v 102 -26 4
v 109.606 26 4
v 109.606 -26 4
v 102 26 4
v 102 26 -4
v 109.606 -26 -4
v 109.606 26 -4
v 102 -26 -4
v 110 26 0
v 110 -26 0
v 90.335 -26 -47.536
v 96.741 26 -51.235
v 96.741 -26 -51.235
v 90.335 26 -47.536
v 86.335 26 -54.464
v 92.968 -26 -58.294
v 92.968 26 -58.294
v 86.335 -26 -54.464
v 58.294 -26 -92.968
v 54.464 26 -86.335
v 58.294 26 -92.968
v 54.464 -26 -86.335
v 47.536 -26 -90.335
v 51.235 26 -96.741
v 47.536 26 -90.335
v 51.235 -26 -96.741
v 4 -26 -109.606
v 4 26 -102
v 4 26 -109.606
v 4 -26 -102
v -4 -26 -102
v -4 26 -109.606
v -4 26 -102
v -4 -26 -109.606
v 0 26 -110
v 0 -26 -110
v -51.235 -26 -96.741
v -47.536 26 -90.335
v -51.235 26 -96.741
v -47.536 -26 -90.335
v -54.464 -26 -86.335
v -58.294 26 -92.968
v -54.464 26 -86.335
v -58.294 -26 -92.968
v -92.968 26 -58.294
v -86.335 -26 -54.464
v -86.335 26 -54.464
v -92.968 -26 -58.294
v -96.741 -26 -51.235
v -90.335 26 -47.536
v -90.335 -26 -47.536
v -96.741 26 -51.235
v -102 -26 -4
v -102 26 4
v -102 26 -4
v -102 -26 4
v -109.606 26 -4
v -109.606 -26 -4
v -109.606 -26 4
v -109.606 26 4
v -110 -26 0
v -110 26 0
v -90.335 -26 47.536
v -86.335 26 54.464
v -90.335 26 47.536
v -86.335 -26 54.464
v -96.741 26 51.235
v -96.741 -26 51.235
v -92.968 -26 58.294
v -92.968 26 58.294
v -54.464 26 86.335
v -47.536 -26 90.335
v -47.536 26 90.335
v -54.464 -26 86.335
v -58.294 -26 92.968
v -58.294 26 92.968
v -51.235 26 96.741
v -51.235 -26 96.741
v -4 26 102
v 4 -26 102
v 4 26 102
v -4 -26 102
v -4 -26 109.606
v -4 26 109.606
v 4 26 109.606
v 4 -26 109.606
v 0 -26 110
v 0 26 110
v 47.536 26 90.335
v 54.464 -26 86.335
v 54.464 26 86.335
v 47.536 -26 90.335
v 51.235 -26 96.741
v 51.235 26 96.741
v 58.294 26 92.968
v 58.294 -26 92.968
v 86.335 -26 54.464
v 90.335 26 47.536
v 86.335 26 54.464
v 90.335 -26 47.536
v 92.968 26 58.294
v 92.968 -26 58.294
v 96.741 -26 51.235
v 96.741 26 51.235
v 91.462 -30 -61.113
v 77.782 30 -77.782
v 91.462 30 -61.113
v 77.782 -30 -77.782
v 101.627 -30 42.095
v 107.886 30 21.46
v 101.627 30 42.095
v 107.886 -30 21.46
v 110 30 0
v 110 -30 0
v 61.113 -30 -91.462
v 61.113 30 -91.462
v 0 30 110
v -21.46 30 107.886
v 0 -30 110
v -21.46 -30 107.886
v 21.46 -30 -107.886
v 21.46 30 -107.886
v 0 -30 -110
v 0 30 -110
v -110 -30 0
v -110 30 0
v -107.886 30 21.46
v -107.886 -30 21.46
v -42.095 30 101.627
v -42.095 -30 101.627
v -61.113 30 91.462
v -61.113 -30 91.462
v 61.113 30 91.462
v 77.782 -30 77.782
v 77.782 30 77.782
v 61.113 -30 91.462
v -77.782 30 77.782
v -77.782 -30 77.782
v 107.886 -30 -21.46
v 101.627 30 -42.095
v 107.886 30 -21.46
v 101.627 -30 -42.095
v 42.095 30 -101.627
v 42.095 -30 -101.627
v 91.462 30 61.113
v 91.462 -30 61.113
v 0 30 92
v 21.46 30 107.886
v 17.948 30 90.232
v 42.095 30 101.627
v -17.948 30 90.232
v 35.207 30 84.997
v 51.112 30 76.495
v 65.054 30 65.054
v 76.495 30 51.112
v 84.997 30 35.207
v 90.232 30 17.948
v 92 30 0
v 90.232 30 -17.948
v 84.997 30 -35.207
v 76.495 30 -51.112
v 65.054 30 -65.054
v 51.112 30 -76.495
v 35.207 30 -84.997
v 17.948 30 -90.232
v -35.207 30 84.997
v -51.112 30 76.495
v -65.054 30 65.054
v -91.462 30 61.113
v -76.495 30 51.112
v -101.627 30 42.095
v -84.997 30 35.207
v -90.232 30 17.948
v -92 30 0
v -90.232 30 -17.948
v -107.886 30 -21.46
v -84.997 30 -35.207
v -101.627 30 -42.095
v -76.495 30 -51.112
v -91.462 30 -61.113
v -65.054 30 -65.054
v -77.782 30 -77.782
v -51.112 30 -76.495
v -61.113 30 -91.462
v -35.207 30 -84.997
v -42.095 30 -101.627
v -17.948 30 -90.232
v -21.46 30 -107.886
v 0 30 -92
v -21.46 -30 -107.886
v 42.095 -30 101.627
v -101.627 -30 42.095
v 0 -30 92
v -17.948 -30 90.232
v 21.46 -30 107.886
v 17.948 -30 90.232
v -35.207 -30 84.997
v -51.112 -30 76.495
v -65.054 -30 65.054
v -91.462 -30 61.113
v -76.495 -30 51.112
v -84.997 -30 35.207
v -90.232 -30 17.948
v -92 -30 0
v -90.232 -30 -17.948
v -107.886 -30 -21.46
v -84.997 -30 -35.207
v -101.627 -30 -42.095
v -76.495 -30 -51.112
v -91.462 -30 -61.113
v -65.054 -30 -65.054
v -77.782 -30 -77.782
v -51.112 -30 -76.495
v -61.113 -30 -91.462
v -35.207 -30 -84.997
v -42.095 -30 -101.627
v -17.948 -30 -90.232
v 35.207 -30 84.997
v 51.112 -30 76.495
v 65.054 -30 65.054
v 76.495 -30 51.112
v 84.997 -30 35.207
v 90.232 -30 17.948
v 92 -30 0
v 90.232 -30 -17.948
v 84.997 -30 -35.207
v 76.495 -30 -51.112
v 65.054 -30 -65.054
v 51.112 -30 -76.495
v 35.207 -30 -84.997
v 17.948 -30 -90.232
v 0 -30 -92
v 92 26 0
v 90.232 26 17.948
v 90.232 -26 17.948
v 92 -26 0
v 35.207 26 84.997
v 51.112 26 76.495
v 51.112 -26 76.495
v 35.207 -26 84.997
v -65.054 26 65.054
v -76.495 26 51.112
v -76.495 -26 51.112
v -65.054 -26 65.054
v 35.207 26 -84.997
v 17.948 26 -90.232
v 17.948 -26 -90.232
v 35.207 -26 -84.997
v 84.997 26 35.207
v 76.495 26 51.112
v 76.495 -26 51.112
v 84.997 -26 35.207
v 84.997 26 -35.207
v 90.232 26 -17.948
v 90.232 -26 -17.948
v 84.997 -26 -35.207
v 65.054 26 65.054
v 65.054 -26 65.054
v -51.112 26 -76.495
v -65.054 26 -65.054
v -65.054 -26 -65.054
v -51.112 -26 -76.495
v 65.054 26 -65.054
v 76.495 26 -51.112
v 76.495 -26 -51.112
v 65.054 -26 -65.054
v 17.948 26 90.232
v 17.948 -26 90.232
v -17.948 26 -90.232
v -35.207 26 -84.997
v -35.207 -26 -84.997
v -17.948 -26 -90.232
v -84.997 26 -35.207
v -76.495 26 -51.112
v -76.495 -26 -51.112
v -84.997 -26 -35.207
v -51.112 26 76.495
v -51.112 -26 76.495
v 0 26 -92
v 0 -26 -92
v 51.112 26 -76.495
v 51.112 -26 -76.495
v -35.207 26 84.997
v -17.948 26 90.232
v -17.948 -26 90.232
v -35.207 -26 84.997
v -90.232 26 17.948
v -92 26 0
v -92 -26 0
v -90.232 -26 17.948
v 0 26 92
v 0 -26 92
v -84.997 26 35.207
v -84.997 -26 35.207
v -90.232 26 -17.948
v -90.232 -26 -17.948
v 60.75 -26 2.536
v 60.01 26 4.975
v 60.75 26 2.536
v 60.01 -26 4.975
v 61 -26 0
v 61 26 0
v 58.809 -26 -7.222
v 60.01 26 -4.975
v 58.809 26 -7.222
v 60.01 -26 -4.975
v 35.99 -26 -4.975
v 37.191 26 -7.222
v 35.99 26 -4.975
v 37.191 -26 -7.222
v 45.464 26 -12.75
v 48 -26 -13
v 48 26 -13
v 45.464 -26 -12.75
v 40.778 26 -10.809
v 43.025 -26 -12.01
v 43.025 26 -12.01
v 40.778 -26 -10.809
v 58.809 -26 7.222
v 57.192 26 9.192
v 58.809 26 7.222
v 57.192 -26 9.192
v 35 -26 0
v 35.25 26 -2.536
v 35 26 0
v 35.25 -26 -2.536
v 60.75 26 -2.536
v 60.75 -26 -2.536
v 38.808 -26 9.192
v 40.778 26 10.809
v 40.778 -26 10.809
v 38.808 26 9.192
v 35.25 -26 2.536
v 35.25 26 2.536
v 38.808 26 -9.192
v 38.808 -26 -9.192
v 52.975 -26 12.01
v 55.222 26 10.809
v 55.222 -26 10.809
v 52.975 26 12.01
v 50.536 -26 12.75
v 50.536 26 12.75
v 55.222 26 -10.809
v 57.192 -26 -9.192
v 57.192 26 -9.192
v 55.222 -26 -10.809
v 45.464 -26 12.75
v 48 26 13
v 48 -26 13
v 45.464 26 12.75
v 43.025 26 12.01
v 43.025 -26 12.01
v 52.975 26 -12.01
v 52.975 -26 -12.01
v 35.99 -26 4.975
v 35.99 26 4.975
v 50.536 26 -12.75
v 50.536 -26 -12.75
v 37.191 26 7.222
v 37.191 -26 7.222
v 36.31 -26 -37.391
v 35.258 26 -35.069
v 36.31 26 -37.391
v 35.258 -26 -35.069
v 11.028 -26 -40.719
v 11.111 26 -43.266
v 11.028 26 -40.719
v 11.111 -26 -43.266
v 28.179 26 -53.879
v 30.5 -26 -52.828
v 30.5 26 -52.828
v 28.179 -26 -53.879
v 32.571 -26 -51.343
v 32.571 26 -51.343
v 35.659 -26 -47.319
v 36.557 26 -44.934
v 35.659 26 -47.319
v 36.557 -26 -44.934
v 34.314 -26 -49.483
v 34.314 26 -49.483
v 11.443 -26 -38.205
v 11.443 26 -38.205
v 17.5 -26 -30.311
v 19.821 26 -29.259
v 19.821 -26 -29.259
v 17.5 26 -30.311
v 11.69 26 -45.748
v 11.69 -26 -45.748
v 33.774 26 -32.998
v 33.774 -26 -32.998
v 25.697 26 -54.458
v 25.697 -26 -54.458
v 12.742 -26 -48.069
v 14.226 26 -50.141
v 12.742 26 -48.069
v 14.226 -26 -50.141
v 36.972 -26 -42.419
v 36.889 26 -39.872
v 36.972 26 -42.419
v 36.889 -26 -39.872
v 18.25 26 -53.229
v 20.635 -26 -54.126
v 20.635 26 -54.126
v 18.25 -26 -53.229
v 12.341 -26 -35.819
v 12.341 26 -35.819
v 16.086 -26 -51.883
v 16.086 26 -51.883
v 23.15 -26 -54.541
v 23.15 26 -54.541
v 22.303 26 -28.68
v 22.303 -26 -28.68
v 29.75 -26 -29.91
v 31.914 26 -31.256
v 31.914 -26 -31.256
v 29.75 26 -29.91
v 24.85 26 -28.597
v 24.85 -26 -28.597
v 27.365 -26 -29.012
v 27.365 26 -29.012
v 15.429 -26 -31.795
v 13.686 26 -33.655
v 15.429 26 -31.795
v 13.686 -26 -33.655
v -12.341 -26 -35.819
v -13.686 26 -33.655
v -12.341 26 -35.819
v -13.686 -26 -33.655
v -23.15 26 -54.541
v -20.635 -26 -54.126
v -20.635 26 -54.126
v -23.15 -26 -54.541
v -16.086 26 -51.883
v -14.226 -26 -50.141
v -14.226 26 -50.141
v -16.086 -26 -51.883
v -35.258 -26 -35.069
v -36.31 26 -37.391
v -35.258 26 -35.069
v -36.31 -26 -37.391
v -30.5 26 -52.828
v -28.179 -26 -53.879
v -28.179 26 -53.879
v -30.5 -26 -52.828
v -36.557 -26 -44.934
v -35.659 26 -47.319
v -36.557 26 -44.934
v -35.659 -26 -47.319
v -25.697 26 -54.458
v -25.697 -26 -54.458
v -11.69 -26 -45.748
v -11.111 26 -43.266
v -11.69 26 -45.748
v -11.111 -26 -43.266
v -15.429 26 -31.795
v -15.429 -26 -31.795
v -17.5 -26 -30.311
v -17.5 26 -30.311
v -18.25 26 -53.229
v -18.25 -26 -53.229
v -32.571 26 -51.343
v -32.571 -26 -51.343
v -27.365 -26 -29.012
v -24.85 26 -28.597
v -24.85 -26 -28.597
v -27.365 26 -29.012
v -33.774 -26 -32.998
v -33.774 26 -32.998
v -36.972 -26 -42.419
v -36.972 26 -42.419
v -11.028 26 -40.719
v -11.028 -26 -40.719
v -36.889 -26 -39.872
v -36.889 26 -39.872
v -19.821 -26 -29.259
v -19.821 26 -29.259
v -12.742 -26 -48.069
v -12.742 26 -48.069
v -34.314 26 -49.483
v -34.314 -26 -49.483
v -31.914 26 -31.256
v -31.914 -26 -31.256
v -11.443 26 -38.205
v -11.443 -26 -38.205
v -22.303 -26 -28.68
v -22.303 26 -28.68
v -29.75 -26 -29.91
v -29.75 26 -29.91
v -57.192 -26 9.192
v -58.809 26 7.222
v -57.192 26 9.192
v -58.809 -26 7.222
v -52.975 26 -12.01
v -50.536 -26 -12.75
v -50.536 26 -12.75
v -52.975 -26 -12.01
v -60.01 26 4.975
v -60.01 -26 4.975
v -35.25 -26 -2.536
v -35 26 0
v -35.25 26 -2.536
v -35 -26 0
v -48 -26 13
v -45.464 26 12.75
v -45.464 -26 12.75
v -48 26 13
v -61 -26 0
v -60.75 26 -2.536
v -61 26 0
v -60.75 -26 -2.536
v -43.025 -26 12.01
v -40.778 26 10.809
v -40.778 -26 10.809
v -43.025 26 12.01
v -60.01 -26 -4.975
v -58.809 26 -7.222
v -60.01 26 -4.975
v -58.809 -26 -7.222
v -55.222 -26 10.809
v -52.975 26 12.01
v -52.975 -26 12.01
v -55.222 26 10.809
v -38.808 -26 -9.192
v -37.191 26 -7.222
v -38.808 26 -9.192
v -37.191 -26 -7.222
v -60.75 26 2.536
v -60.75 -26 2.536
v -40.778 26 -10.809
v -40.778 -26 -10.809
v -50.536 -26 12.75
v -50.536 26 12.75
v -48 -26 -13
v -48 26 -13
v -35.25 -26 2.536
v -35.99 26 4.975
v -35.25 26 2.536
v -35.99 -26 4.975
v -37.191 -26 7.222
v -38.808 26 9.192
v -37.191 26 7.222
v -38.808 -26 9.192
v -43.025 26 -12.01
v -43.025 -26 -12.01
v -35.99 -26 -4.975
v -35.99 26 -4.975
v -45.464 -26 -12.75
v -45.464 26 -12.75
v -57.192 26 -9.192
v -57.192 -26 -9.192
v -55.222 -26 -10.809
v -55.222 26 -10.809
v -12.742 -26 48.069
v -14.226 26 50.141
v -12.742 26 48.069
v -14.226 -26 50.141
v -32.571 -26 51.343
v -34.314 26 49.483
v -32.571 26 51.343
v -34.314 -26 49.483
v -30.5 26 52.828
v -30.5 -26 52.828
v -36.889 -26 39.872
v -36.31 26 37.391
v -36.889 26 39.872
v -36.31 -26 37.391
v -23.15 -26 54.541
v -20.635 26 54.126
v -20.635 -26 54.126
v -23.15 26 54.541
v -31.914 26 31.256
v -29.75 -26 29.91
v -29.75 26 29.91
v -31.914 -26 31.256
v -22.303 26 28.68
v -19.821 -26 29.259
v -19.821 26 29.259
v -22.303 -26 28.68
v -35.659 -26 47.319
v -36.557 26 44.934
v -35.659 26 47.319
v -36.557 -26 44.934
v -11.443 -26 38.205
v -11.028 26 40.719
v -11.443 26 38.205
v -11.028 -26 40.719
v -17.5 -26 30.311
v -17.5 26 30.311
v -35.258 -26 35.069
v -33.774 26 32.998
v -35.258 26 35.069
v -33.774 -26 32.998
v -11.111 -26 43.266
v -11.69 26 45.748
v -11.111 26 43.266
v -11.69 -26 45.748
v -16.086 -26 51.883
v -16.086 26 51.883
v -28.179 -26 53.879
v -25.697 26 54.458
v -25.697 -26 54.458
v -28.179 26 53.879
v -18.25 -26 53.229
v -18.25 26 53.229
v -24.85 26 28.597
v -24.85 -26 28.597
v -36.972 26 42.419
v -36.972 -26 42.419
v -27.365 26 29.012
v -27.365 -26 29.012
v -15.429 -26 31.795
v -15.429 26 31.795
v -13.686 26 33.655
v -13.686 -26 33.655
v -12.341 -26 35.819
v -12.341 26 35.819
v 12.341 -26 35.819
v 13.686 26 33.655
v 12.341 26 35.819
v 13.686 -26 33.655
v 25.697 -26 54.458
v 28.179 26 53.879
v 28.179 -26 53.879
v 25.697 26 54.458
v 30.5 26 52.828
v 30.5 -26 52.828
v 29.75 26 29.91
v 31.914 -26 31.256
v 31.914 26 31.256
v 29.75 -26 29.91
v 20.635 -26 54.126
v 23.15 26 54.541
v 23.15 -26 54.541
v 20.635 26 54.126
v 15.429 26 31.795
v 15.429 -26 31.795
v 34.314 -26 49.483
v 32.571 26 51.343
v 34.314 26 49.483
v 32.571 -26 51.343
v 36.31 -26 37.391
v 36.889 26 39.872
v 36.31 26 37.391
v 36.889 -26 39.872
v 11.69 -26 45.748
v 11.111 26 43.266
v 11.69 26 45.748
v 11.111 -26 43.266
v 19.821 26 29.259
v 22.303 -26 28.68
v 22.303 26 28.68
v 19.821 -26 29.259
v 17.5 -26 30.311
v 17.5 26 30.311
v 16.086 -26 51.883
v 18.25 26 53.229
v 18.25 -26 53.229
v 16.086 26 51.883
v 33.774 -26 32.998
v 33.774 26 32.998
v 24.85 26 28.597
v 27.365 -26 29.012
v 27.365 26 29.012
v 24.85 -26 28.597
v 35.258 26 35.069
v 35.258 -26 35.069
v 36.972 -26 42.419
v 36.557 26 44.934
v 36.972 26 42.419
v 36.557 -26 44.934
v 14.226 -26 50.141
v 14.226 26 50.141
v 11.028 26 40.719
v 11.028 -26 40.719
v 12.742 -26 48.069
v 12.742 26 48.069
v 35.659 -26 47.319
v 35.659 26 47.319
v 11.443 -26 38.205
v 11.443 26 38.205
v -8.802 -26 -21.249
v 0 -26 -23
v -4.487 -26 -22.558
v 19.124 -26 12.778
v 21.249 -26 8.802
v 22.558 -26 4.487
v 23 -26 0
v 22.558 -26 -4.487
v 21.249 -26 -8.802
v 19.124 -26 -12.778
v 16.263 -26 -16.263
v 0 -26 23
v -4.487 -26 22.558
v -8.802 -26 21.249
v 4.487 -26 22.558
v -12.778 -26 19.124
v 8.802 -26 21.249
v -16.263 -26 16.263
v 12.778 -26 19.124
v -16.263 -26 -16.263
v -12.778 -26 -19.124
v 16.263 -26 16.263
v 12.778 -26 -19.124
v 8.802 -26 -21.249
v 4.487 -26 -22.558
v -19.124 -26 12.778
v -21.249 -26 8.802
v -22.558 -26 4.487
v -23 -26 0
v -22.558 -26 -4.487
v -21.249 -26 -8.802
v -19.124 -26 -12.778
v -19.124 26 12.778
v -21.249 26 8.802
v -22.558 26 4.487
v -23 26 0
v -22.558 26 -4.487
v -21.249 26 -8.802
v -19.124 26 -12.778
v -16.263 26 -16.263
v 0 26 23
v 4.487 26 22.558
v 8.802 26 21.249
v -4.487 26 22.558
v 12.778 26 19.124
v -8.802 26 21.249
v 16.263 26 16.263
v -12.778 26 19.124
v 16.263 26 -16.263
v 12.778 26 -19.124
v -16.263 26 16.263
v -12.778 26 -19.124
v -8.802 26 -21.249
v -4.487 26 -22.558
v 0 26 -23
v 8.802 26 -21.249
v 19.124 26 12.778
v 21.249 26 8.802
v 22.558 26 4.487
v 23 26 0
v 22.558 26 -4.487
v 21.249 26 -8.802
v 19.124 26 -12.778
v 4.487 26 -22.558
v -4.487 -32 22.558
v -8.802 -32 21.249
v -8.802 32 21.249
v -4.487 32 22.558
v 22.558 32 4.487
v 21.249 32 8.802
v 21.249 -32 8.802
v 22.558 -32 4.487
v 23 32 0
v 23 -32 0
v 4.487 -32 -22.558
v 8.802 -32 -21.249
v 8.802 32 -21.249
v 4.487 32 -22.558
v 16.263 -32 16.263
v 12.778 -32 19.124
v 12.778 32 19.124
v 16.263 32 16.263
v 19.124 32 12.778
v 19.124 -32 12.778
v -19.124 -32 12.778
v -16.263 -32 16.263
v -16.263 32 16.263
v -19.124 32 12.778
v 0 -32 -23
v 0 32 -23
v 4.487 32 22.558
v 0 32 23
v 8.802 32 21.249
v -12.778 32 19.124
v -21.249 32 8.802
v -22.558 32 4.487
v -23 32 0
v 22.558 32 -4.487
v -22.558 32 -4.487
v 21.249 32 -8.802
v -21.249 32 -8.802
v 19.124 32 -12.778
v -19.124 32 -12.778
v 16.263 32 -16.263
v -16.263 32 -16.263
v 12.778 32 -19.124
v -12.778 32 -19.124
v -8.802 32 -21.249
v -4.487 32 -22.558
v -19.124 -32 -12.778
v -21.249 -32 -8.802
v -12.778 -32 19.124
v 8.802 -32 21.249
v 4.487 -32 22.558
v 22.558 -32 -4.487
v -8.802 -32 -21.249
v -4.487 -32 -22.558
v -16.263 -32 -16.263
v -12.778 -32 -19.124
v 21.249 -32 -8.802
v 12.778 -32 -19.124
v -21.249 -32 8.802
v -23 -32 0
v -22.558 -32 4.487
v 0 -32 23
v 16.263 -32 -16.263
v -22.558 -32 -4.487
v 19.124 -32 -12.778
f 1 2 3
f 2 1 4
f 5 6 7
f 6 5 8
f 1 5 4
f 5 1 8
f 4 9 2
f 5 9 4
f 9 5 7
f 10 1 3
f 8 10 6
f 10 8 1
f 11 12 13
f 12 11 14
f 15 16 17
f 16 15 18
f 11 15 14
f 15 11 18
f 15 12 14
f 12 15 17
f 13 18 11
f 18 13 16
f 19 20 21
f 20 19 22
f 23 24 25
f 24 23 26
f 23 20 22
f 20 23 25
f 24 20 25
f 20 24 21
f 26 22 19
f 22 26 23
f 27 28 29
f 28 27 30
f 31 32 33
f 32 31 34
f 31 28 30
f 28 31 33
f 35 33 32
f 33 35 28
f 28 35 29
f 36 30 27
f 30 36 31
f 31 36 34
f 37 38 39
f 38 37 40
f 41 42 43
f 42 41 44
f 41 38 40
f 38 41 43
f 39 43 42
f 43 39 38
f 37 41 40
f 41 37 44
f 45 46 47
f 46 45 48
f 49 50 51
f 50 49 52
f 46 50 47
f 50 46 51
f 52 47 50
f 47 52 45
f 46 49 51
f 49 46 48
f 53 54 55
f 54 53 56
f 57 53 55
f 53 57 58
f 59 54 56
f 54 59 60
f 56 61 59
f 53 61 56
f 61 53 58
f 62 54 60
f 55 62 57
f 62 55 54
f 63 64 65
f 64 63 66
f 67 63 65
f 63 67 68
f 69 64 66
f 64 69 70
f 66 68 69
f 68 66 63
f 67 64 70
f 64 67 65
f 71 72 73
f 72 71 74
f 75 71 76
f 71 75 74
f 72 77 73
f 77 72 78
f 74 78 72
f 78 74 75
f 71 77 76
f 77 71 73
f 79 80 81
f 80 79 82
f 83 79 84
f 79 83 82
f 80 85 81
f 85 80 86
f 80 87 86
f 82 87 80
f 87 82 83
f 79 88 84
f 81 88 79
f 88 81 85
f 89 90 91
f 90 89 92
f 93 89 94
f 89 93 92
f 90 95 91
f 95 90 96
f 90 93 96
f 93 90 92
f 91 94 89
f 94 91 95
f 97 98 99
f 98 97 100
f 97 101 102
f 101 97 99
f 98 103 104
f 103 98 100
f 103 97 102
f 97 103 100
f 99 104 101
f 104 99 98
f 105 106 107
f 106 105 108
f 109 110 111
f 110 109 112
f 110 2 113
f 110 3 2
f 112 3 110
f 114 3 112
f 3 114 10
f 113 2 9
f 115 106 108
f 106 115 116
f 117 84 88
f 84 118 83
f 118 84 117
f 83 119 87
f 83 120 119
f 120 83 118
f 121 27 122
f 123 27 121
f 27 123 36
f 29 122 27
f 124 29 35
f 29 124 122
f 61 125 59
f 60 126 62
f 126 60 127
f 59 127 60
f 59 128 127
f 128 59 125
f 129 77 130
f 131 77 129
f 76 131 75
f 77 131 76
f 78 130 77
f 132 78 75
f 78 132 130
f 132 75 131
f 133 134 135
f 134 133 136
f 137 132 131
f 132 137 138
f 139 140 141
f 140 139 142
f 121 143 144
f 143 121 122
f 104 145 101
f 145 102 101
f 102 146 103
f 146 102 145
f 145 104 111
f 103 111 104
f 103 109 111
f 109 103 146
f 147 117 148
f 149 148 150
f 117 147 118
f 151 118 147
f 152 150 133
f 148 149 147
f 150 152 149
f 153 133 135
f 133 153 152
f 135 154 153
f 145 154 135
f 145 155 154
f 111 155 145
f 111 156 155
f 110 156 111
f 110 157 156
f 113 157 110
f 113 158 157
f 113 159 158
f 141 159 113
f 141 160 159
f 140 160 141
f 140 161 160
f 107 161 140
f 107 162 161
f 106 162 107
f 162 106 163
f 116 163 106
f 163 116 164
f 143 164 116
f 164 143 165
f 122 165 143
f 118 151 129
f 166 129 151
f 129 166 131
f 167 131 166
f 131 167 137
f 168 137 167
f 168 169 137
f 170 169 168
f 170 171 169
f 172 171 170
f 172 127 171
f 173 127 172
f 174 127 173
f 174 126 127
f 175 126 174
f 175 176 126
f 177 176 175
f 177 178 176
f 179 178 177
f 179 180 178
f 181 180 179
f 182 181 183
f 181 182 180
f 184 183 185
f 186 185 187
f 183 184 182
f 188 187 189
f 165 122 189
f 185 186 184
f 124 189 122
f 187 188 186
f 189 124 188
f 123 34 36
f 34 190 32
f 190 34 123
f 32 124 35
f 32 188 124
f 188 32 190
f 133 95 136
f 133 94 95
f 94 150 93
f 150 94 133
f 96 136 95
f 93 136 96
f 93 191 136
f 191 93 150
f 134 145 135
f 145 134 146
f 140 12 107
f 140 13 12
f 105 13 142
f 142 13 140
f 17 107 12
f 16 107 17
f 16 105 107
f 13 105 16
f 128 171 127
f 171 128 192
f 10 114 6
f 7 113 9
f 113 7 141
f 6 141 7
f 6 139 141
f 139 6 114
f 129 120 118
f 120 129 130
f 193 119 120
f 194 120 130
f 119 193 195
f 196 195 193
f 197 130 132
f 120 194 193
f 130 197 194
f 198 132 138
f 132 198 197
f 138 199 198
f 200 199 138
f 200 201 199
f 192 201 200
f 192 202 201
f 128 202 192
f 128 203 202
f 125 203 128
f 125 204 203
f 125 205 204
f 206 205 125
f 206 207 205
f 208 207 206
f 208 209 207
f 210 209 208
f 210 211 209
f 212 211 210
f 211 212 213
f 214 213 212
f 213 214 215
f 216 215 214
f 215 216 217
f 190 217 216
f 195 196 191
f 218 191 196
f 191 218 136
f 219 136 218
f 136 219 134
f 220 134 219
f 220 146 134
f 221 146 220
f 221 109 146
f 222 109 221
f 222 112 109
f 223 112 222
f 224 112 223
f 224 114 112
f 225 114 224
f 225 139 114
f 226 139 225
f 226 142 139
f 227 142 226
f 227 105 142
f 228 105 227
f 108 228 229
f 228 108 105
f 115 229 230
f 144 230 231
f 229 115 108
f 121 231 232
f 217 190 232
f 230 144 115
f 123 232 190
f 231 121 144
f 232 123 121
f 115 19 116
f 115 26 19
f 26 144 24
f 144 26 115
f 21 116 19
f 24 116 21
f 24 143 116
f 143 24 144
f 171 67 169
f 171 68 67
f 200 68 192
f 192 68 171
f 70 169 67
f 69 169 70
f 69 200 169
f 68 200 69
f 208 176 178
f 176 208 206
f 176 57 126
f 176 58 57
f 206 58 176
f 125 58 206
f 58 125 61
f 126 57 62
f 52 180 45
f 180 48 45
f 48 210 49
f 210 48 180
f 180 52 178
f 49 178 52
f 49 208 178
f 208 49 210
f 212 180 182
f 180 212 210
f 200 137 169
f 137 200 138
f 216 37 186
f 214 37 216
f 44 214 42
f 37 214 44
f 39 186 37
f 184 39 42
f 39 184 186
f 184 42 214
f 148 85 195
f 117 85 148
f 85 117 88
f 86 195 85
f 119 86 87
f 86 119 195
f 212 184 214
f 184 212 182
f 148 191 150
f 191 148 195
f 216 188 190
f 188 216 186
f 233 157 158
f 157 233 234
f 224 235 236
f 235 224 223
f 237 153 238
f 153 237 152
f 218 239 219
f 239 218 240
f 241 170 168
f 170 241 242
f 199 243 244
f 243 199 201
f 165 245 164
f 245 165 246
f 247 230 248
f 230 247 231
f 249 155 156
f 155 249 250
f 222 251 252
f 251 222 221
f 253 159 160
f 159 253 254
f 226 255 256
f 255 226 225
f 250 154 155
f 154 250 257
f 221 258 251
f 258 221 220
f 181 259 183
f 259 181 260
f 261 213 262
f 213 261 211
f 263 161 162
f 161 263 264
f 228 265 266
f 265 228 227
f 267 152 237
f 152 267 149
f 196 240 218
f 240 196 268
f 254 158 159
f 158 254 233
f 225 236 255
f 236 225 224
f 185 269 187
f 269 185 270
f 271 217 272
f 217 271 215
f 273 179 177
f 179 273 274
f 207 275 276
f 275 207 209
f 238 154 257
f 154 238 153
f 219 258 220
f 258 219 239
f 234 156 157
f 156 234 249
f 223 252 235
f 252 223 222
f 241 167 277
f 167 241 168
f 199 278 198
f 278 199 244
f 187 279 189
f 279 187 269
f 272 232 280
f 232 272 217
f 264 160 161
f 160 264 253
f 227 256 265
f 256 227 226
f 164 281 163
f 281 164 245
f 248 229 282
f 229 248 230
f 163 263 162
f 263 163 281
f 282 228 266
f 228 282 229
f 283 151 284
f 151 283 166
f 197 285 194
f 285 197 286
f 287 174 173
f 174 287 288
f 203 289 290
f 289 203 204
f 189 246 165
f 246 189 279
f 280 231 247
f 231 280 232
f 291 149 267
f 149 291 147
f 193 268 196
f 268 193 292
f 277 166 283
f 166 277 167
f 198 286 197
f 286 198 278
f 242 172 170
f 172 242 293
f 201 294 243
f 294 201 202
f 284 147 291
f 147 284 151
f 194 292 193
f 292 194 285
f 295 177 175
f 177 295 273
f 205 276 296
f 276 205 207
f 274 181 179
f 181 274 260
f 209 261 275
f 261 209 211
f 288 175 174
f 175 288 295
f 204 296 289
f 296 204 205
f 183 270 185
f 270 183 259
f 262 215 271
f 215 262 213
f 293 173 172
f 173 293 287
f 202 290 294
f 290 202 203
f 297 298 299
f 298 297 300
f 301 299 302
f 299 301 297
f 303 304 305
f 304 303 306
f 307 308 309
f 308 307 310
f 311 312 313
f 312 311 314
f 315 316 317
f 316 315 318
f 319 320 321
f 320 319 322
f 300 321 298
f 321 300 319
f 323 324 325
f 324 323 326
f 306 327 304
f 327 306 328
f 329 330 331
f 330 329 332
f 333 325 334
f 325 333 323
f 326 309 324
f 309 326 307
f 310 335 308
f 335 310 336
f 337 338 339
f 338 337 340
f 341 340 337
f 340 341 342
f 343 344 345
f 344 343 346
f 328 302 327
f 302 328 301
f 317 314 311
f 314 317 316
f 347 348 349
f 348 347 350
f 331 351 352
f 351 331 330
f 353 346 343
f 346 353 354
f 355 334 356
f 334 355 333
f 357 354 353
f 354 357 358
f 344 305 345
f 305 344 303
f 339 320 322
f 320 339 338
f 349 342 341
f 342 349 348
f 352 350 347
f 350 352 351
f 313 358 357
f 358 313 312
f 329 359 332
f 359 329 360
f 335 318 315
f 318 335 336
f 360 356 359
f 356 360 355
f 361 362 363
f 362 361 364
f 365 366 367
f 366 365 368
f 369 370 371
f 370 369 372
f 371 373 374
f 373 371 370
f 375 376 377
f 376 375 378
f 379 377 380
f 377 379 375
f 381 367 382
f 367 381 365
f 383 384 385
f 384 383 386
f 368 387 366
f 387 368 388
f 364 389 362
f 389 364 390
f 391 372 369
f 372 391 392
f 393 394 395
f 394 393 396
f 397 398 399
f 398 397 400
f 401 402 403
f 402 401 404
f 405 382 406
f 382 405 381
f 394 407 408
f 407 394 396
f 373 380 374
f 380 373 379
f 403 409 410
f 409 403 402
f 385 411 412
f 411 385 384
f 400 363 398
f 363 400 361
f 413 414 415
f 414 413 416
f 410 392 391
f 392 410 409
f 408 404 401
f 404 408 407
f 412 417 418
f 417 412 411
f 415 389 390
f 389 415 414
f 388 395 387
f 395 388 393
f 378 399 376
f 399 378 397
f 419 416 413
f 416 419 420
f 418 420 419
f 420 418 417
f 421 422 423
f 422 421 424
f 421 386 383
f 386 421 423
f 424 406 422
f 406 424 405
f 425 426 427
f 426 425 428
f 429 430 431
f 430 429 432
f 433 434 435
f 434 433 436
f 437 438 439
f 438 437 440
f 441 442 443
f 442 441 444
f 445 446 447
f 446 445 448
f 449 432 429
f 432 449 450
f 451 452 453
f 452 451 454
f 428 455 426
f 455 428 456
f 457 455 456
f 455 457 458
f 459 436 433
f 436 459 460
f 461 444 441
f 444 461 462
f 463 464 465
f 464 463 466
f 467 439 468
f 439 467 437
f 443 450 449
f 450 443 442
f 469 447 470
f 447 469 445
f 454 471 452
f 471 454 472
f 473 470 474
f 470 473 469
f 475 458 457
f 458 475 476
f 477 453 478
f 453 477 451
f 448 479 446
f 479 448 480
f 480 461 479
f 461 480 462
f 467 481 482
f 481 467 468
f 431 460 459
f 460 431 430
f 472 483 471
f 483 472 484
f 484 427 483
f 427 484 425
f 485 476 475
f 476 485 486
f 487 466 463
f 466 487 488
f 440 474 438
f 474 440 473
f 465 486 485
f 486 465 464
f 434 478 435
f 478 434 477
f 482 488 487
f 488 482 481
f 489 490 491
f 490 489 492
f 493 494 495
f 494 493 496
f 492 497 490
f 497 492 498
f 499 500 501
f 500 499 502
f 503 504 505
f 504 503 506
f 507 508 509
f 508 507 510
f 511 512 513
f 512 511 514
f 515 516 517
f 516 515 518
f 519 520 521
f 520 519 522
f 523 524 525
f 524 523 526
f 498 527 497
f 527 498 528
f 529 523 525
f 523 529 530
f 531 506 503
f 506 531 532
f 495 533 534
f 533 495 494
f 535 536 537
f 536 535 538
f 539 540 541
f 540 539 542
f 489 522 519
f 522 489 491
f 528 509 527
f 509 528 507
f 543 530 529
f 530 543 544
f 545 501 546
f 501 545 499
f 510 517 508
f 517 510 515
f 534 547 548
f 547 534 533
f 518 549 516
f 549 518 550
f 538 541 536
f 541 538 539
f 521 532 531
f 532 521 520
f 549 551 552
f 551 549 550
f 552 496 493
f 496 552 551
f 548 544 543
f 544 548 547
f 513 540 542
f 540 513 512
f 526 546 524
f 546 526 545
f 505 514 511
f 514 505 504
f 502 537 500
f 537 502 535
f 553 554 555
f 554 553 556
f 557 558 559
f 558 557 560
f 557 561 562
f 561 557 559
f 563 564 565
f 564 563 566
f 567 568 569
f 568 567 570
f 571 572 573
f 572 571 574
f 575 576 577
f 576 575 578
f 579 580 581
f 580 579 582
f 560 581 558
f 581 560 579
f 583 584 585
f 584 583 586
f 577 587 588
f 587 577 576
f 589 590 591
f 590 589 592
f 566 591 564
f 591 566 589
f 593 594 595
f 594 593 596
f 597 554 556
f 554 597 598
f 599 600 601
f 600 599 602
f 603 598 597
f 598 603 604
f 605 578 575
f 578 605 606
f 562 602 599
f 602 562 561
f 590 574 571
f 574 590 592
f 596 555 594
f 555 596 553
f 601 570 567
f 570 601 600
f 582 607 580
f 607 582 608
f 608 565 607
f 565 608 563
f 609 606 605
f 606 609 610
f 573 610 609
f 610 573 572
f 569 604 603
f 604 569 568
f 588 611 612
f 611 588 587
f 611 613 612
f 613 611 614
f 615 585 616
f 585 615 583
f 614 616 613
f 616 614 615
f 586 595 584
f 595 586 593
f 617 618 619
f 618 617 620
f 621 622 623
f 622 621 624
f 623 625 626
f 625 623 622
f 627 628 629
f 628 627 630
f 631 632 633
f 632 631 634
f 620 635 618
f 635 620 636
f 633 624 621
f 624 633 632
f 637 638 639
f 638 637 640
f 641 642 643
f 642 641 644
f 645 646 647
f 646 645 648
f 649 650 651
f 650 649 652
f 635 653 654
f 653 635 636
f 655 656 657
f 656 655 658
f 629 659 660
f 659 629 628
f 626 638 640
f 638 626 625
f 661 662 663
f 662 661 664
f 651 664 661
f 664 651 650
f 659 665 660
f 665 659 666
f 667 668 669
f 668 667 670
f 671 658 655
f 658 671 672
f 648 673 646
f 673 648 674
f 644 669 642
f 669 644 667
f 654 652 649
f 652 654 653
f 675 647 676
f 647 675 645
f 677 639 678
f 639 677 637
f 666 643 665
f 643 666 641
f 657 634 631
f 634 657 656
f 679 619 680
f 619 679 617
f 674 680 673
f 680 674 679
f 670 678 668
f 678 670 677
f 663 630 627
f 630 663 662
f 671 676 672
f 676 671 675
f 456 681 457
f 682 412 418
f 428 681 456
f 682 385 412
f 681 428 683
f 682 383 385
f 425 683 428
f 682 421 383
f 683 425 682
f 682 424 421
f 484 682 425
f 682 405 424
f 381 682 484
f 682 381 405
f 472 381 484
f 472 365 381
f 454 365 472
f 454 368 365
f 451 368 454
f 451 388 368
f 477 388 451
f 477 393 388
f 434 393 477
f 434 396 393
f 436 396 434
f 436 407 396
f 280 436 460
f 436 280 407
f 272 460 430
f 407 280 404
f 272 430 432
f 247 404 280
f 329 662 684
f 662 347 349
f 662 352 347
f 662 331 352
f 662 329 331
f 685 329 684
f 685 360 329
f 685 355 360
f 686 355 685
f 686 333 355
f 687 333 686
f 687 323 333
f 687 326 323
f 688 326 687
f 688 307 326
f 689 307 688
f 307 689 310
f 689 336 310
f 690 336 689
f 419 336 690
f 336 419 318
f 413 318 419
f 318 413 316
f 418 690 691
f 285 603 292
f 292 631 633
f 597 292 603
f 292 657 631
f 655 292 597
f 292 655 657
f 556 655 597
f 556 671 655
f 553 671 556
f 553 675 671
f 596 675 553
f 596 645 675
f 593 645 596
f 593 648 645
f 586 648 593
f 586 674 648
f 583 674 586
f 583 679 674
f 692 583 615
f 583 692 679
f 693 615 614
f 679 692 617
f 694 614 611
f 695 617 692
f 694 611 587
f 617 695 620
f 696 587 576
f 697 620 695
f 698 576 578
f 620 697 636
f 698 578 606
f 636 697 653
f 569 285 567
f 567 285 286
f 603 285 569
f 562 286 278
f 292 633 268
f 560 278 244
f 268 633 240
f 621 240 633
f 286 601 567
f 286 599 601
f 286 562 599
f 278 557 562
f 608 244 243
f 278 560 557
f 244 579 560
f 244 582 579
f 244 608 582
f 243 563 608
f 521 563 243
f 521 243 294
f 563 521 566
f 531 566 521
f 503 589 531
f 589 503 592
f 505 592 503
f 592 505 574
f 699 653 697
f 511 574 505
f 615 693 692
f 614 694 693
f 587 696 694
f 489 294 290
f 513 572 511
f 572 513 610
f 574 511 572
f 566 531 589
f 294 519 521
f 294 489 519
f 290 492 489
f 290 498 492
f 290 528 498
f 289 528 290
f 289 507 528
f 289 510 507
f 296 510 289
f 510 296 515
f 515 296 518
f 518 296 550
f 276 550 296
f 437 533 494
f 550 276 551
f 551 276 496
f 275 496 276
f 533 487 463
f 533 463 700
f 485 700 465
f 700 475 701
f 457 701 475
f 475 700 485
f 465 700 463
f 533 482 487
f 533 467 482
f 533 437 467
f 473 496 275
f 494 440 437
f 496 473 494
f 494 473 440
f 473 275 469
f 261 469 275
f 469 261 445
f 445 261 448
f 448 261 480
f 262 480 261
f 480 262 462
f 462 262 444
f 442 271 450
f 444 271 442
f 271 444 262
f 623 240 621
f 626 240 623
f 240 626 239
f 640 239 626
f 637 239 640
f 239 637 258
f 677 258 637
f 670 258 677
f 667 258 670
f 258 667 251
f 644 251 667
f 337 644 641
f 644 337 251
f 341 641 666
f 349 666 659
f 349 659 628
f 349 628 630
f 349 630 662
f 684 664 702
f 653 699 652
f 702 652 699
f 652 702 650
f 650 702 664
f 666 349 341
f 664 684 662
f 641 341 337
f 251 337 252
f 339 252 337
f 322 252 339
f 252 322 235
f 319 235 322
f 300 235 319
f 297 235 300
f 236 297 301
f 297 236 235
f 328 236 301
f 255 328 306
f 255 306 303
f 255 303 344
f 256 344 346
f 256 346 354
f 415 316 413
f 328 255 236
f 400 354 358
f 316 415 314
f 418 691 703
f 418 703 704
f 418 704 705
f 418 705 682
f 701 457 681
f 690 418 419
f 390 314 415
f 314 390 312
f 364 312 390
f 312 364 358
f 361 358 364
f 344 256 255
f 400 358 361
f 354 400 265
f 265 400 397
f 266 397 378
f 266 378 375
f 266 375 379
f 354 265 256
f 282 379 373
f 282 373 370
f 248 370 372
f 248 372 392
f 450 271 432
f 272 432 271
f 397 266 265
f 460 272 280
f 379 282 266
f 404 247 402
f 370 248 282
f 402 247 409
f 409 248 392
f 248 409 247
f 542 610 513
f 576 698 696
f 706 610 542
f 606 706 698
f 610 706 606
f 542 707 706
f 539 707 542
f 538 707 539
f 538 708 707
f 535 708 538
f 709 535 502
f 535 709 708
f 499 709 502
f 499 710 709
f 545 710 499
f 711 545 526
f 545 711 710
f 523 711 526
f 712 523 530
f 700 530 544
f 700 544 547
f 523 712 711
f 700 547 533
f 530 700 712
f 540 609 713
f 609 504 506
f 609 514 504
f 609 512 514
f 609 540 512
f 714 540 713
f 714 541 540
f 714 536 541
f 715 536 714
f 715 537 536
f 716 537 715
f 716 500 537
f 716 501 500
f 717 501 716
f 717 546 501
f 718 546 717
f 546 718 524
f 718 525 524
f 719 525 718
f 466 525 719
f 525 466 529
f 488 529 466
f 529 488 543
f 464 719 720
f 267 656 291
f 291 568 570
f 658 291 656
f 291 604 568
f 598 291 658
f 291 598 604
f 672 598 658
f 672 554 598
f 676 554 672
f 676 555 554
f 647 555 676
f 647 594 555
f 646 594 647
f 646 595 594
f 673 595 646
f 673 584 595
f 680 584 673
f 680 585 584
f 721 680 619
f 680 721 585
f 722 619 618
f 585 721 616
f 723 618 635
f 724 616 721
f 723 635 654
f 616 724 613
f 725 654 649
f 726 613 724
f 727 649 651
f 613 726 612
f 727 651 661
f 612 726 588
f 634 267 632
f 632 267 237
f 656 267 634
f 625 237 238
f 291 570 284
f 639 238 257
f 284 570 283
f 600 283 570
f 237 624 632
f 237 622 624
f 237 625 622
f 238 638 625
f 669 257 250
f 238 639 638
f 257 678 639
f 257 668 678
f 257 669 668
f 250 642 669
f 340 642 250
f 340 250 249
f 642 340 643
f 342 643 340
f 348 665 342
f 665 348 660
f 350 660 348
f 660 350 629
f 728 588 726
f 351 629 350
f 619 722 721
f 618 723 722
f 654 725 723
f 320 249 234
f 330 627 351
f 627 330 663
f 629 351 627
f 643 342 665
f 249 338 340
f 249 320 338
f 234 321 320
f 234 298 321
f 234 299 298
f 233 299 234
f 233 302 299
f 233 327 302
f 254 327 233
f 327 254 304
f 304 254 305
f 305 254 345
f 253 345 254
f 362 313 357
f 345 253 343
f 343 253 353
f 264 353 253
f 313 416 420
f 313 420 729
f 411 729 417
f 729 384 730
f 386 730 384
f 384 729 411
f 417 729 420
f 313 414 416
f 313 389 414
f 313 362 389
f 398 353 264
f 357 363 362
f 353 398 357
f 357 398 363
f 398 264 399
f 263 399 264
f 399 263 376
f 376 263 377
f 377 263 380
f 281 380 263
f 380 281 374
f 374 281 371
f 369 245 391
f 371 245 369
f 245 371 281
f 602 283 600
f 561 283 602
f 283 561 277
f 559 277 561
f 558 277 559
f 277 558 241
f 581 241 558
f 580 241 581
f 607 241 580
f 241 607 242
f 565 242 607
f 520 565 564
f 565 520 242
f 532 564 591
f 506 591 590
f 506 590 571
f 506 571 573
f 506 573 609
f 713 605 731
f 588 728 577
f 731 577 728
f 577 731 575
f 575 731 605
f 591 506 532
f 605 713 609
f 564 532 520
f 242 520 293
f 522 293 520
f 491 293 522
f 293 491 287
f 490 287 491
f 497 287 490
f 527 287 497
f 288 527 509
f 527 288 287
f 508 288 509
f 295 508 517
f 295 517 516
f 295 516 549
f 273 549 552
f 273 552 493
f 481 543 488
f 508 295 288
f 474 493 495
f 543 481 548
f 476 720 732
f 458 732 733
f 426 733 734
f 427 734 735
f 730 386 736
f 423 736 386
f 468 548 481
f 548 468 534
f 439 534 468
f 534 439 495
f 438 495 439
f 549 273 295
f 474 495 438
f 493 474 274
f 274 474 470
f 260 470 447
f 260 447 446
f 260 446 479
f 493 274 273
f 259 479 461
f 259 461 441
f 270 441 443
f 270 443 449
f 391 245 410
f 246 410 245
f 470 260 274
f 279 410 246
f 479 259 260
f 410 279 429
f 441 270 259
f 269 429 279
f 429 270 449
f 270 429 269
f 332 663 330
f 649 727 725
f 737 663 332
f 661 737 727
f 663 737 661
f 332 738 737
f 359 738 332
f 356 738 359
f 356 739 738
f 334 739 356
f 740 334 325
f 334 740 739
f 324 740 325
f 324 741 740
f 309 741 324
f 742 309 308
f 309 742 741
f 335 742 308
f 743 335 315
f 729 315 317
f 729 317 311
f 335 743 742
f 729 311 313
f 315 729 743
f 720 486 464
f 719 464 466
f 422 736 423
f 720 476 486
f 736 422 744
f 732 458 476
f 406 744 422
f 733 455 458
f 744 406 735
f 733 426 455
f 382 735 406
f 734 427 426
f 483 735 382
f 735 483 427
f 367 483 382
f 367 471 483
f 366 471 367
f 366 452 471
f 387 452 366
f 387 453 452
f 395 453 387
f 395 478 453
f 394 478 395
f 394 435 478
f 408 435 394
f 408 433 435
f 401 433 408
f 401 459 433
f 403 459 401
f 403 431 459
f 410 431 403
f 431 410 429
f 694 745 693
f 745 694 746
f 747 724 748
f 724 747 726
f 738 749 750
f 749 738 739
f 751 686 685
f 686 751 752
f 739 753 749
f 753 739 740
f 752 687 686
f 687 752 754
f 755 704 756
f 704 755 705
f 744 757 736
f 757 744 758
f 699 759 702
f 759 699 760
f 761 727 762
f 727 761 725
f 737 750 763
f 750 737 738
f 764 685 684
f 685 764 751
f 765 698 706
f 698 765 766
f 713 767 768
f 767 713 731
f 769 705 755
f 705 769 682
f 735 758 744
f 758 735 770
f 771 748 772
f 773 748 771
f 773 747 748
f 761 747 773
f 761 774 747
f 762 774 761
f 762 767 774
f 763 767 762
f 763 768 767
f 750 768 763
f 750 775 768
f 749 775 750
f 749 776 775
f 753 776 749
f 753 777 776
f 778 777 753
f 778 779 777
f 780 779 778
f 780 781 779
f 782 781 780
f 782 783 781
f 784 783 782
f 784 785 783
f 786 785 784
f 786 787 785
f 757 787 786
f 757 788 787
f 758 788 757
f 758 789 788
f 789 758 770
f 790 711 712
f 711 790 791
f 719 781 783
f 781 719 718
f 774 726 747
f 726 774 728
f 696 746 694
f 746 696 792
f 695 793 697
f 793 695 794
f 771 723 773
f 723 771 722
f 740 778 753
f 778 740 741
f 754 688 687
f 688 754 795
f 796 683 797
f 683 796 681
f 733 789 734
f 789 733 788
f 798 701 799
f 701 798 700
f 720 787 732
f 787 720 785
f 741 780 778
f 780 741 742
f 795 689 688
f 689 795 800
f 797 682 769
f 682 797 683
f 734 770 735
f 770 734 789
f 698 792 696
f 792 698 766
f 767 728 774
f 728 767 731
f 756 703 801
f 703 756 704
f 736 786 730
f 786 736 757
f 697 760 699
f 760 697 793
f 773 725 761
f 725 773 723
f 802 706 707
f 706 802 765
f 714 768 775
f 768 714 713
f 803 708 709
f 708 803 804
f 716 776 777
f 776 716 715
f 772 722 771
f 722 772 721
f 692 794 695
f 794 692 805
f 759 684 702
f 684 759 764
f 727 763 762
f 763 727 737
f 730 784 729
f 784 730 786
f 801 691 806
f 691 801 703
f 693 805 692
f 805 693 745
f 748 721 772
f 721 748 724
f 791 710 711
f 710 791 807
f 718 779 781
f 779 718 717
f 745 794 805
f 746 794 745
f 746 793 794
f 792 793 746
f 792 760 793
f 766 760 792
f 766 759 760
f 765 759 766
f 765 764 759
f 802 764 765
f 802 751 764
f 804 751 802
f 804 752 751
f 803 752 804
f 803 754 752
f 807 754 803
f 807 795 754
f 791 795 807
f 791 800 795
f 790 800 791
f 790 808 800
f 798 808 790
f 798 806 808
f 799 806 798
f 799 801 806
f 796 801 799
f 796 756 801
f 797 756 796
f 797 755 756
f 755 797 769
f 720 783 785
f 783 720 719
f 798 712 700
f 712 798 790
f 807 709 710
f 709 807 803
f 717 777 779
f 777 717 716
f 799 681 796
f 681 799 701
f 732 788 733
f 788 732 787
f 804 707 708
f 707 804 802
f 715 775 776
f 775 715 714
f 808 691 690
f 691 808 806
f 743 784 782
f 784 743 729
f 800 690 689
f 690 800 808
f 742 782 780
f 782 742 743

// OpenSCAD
// ============================================================================
// FILE: export_left_wheel.scad
// OUTPUT: left_wheel_visual.stl
// PURPOSE: Export only the left main drive wheel.
// ============================================================================

// Chi nap module va function tu main.scad.
// Khong chay factory_scene() trong main.scad.
use <main.scad>


// ============================================================================
// RENDER SETTINGS
// Units: millimeters
// ============================================================================

eps = 0.05;

quality = "render";

preview_fn = 32;
render_fn  = 72;

$fn = quality == "render"
    ? render_fn
    : preview_fn;


// ============================================================================
// PARAMETERS REQUIRED BY drive_wheel()
// ============================================================================

// Main drive-wheel dimensions
drive_wheel_diameter = 220;
drive_wheel_width    = 60;

// Derived radius
drive_wheel_radius =
    drive_wheel_diameter / 2;

// Distance between the left and right wheel centerlines
drive_wheel_track = 620;

// Wheel axle height above the ground
drive_wheel_axle_z =
    drive_wheel_radius;

// Disable component labels
show_component_labels = false;


// ============================================================================
// LEFT WHEEL EXPORT
// ============================================================================
//
// Original left-wheel axle center:
//
// X = 0 mm
// Y = +310 mm
// Z = +110 mm
//
// Move the axle center to STL origin [0, 0, 0].
//
// URDF joint configuration:
//
// origin xyz="0 0.310 0.110"
// axis xyz="0 1 0"
// ============================================================================

translate([
    0,
    -drive_wheel_track / 2,
    -drive_wheel_axle_z
])
    drive_wheel(
        1,
        0
    );
